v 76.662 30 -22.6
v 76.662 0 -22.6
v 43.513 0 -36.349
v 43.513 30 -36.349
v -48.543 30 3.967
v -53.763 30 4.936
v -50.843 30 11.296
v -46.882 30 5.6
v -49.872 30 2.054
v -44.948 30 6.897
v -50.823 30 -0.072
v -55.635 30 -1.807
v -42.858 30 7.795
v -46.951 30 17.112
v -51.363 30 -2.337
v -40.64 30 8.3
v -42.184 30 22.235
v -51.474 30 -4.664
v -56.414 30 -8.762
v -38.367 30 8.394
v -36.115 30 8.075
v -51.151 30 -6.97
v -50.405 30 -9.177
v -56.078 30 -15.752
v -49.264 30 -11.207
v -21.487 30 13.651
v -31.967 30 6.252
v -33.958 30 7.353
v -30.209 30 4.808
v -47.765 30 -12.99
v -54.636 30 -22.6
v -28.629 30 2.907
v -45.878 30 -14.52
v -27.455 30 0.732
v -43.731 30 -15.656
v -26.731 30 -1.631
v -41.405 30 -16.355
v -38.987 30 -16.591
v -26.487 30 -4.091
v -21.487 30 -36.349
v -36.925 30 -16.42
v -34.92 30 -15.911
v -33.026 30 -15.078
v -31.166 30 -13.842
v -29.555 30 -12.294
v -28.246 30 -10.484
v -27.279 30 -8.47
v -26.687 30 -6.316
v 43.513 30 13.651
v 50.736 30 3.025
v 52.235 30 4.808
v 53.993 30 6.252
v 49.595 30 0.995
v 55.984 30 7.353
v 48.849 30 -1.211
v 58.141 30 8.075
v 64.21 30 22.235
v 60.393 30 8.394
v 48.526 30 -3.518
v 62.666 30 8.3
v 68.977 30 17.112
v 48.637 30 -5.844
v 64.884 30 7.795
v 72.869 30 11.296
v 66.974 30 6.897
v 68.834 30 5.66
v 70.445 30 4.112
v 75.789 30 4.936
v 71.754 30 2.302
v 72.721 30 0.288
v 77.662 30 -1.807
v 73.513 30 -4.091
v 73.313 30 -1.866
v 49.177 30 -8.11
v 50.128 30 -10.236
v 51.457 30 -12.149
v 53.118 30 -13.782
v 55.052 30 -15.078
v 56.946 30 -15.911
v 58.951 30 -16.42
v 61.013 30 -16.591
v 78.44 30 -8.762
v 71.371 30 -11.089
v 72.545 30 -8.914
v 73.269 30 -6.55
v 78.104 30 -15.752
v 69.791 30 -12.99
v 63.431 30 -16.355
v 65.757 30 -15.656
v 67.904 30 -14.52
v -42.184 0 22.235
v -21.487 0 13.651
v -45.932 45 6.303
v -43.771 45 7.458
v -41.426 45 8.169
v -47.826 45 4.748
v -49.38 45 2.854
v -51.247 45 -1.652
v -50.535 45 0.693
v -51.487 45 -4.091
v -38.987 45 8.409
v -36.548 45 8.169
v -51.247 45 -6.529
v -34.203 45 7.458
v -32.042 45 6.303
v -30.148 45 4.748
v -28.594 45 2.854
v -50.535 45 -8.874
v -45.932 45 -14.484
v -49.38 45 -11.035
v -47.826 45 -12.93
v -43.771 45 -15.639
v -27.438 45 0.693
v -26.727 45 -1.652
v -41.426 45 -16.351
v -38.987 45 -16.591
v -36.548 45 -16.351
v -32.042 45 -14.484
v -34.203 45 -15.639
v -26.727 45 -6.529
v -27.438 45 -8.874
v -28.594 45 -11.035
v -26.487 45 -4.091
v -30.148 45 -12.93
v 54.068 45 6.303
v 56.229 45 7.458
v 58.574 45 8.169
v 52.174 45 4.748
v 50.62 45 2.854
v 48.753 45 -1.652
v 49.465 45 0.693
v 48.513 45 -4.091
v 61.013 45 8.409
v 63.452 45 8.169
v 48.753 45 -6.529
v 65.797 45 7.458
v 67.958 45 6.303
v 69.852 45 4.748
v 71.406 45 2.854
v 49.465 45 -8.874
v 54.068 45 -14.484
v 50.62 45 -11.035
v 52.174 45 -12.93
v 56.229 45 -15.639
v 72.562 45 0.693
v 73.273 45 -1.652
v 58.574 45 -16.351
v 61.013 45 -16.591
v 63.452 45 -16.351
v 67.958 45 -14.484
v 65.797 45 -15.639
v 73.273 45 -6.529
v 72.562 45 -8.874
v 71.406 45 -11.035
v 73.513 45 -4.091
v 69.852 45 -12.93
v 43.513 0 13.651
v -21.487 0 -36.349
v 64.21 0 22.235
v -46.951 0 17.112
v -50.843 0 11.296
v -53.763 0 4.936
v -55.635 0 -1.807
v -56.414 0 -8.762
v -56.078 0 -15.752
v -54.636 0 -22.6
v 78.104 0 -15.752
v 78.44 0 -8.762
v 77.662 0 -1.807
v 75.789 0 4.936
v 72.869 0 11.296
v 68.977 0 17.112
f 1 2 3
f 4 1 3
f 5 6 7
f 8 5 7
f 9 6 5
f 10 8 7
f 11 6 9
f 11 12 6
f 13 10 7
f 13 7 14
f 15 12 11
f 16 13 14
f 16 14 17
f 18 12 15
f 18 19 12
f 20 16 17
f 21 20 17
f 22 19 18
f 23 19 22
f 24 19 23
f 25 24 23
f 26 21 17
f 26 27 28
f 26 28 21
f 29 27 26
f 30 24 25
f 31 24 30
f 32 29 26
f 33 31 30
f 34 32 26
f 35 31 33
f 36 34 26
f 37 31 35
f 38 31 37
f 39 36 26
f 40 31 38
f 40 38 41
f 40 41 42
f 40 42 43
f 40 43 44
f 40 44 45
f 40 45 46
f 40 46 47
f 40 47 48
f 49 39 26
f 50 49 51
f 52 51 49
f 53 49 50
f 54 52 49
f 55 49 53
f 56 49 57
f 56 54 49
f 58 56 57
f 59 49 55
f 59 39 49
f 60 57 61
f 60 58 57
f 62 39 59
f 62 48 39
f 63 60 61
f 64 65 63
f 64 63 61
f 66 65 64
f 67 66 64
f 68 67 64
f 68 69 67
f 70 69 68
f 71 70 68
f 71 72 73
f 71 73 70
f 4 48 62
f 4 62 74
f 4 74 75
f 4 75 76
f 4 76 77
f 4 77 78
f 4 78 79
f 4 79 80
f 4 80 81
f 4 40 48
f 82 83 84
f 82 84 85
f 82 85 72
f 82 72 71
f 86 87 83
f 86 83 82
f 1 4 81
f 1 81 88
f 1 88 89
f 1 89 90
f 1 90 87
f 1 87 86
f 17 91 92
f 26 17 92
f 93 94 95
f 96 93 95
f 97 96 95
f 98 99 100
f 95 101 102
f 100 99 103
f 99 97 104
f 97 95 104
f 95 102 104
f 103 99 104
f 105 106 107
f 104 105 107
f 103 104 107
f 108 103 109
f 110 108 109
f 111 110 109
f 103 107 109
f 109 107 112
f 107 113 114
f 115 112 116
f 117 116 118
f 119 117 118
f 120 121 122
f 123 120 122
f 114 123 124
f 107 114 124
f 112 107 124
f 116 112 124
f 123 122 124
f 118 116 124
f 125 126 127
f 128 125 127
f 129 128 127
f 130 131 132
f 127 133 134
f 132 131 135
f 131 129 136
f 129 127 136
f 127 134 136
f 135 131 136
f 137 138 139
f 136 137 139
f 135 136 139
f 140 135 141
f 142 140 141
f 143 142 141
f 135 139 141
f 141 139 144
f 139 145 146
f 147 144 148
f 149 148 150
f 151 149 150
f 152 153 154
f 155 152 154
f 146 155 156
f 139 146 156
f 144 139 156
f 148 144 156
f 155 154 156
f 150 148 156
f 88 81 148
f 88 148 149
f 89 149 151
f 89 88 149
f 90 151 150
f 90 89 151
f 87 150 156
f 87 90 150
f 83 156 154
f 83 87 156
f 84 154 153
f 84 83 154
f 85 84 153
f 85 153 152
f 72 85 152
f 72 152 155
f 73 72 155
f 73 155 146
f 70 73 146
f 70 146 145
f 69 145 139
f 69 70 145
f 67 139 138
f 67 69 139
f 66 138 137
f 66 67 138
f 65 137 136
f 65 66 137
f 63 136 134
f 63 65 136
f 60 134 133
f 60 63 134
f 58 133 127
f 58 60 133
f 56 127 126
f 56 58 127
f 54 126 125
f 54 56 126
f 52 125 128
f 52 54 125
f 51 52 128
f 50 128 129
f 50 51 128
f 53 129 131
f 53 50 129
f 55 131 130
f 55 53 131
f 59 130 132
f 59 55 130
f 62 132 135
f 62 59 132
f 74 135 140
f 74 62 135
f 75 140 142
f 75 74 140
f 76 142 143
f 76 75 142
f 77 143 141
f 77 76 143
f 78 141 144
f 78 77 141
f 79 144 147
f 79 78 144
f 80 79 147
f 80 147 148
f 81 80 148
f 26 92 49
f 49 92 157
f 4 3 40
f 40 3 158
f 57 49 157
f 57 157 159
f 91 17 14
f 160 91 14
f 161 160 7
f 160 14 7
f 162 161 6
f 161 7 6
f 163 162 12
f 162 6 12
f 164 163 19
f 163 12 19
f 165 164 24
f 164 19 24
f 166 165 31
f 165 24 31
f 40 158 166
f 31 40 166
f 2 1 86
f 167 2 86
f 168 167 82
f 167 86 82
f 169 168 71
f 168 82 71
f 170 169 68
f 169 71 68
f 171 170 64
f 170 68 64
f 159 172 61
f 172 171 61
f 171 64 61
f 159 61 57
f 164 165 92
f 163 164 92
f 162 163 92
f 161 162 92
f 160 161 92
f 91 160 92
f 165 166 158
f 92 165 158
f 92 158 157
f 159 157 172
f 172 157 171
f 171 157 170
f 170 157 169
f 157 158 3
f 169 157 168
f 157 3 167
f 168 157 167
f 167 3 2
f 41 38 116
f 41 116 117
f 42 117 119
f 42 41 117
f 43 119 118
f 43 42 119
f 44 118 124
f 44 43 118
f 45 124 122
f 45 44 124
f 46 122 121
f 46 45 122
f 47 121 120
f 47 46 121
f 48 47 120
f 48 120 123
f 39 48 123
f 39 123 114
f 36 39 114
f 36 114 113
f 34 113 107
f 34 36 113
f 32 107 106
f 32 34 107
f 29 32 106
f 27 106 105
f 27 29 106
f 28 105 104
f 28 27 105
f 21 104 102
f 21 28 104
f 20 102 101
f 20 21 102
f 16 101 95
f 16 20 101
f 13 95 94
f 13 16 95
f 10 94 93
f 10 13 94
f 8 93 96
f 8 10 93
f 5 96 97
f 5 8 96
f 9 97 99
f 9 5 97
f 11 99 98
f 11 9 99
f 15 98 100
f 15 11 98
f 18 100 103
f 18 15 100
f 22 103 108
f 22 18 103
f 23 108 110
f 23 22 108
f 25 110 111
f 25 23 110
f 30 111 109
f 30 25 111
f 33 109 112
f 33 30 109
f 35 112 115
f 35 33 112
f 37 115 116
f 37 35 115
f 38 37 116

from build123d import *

# Parameters (mm, degrees)
SKETCH2_W           = 32.5
SKETCH2_H           = 50
BOSS_EXTRUDE1_DEPTH = 30
FILLET1_R           = 3
SKETCH3_R           = 12.5
BOSS_EXTRUDE2_DEPTH = 45
CUT_EXTRUDE1_DEPTH  = 92.572762002


with BuildPart() as part:
    # Sketch2 → Boss-Extrude1 (new body)
    with BuildSketch(Plane(origin=(0, 0, 0), x_dir=(1, 0, 0), z_dir=(0, 1, 0))):
        with BuildLine():
            Line((-33.026431533, 15.07807147), (-21.486968519, 36.349341511))
            Line((-21.486968519, 36.349341511), (-56.486968519, 21.832088794))
            Line((-56.486968519, 21.832088794), (-47.76505884, 12.989879738))
            ThreePointArc((-47.76505884, 12.989879738), (-40.740475826, 16.467112533), (-33.026431533, 15.07807147))
        make_face()
        with BuildLine():
            Line((-47.76505884, 12.989879738), (-56.486968519, 21.832088794))
            Line((-56.486968519, 21.832088794), (-56.486968519, -28.167911206))
            Line((-56.486968519, -28.167911206), (-44.947505506, -6.896641164))
            ThreePointArc((-44.947505506, -6.896641164), (-51.3633659, 2.337207846), (-47.76505884, 12.989879738))
        make_face()
        with BuildLine():
            Line((-56.486968519, -28.167911206), (-21.486968519, -13.650658489))
            Line((-21.486968519, -13.650658489), (-30.208878198, -4.808449432))
            ThreePointArc((-30.208878198, -4.808449432), (-37.233461212, -8.285682228), (-44.947505506, -6.896641164))
            Line((-44.947505506, -6.896641164), (-56.486968519, -28.167911206))
        make_face()
        with BuildLine():
            Line((-21.486968519, -13.650658489), (-21.486968519, 36.349341511))
            Line((-21.486968519, 36.349341511), (-33.026431533, 15.07807147))
            ThreePointArc((-33.026431533, 15.07807147), (-28.245536763, 10.483808601), (-26.486968519, 4.090715153))
            ThreePointArc((-26.486968519, 4.090715153), (-27.454923405, -0.732347722), (-30.208878198, -4.808449432))
            Line((-30.208878198, -4.808449432), (-21.486968519, -13.650658489))
        make_face()
        with Locations((-5.236968519, 11.349341511)):
            Rectangle(SKETCH2_W, SKETCH2_H)
        with BuildLine():
            Line((55.052494494, 15.07807147), (43.513031481, 36.349341511))
            Line((43.513031481, 36.349341511), (43.513031481, -13.650658489))
            Line((43.513031481, -13.650658489), (52.23494116, -4.808449432))
            ThreePointArc((52.23494116, -4.808449432), (48.6366341, 5.84422246), (55.052494494, 15.07807147))
        make_face()
        with BuildLine():
            Line((78.513031481, 21.832088794), (43.513031481, 36.349341511))
            Line((43.513031481, 36.349341511), (55.052494494, 15.07807147))
            ThreePointArc((55.052494494, 15.07807147), (62.766538788, 16.467112533), (69.791121802, 12.989879738))
            Line((69.791121802, 12.989879738), (78.513031481, 21.832088794))
        make_face()
        with BuildLine():
            Line((78.513031481, -28.167911206), (78.513031481, 21.832088794))
            Line((78.513031481, 21.832088794), (69.791121802, 12.989879738))
            ThreePointArc((69.791121802, 12.989879738), (72.545076595, 8.913778028), (73.513031481, 4.090715153))
            ThreePointArc((73.513031481, 4.090715153), (71.754463237, -2.302378295), (66.973568467, -6.896641164))
            Line((66.973568467, -6.896641164), (78.513031481, -28.167911206))
        make_face()
        with BuildLine():
            Line((52.23494116, -4.808449432), (43.513031481, -13.650658489))
            Line((43.513031481, -13.650658489), (78.513031481, -28.167911206))
            Line((78.513031481, -28.167911206), (66.973568467, -6.896641164))
            ThreePointArc((66.973568467, -6.896641164), (59.259524174, -8.285682228), (52.23494116, -4.808449432))
        make_face()
        with Locations((27.263031481, 11.349341511)):
            Rectangle(SKETCH2_W, SKETCH2_H)
    extrude(amount=BOSS_EXTRUDE1_DEPTH)

    # Fillet1
    fillet1_edges = [part.edges().sort_by_distance(p)[0] for p in [
        (-56.486968519, 15, 28.167911206),
        (-56.486968519, 15, -21.832088794),
        (78.513031481, 15, -21.832088794),
        (78.513031481, 15, 28.167911206),
    ]]
    fillet(fillet1_edges, radius=FILLET1_R)

    # Sketch3 → Boss-Extrude2 (add)
    with BuildSketch(Plane(origin=(0, 0, 0), x_dir=(-1, 0, 0), z_dir=(0, -1, 0))):
        with Locations(Location((38.986968519, 4.090715153, 0), (0, 0, 90))):
            Circle(SKETCH3_R)
        with Locations(Location((-61.013031481, 4.090715153, 0), (0, 0, 90))):
            Circle(SKETCH3_R)
    extrude(amount=-BOSS_EXTRUDE2_DEPTH)

    # Sketch4 → Cut-Extrude1 (cut, through all)
    with BuildSketch(Plane(origin=(0, 30, 0), x_dir=(1, 0, 0), z_dir=(0, 1, 0))):
        with BuildLine():
            ThreePointArc((-56.486968519, -23.675749532), (-55.153077724, -26.17056017), (-52.337581774, -26.446834177))
            Line((-52.337581774, -26.446834177), (-42.18410533, -22.235388934))
            ThreePointArc((-42.18410533, -22.235388934), (-54.833584995, -1.601840339), (-54.636355265, 22.59968366))
            ThreePointArc((-54.636355265, 22.59968366), (-55.981779157, 21.494708219), (-56.486968519, 19.828599015))
            Line((-56.486968519, 19.828599015), (-56.486968519, -23.675749532))
        make_face()
        with BuildLine():
            Line((64.210168291, -22.235388934), (74.363644735, -26.446834177))
            ThreePointArc((74.363644735, -26.446834177), (77.179140685, -26.17056017), (78.513031481, -23.675749532))
            Line((78.513031481, -23.675749532), (78.513031481, 19.828599015))
            ThreePointArc((78.513031481, 19.828599015), (78.007842119, 21.494708219), (76.662418226, 22.59968366))
            ThreePointArc((76.662418226, 22.59968366), (76.859647957, -1.601840339), (64.210168291, -22.235388934))
        make_face()
    extrude(amount=-CUT_EXTRUDE1_DEPTH, mode=Mode.SUBTRACT)


solid = part.part
